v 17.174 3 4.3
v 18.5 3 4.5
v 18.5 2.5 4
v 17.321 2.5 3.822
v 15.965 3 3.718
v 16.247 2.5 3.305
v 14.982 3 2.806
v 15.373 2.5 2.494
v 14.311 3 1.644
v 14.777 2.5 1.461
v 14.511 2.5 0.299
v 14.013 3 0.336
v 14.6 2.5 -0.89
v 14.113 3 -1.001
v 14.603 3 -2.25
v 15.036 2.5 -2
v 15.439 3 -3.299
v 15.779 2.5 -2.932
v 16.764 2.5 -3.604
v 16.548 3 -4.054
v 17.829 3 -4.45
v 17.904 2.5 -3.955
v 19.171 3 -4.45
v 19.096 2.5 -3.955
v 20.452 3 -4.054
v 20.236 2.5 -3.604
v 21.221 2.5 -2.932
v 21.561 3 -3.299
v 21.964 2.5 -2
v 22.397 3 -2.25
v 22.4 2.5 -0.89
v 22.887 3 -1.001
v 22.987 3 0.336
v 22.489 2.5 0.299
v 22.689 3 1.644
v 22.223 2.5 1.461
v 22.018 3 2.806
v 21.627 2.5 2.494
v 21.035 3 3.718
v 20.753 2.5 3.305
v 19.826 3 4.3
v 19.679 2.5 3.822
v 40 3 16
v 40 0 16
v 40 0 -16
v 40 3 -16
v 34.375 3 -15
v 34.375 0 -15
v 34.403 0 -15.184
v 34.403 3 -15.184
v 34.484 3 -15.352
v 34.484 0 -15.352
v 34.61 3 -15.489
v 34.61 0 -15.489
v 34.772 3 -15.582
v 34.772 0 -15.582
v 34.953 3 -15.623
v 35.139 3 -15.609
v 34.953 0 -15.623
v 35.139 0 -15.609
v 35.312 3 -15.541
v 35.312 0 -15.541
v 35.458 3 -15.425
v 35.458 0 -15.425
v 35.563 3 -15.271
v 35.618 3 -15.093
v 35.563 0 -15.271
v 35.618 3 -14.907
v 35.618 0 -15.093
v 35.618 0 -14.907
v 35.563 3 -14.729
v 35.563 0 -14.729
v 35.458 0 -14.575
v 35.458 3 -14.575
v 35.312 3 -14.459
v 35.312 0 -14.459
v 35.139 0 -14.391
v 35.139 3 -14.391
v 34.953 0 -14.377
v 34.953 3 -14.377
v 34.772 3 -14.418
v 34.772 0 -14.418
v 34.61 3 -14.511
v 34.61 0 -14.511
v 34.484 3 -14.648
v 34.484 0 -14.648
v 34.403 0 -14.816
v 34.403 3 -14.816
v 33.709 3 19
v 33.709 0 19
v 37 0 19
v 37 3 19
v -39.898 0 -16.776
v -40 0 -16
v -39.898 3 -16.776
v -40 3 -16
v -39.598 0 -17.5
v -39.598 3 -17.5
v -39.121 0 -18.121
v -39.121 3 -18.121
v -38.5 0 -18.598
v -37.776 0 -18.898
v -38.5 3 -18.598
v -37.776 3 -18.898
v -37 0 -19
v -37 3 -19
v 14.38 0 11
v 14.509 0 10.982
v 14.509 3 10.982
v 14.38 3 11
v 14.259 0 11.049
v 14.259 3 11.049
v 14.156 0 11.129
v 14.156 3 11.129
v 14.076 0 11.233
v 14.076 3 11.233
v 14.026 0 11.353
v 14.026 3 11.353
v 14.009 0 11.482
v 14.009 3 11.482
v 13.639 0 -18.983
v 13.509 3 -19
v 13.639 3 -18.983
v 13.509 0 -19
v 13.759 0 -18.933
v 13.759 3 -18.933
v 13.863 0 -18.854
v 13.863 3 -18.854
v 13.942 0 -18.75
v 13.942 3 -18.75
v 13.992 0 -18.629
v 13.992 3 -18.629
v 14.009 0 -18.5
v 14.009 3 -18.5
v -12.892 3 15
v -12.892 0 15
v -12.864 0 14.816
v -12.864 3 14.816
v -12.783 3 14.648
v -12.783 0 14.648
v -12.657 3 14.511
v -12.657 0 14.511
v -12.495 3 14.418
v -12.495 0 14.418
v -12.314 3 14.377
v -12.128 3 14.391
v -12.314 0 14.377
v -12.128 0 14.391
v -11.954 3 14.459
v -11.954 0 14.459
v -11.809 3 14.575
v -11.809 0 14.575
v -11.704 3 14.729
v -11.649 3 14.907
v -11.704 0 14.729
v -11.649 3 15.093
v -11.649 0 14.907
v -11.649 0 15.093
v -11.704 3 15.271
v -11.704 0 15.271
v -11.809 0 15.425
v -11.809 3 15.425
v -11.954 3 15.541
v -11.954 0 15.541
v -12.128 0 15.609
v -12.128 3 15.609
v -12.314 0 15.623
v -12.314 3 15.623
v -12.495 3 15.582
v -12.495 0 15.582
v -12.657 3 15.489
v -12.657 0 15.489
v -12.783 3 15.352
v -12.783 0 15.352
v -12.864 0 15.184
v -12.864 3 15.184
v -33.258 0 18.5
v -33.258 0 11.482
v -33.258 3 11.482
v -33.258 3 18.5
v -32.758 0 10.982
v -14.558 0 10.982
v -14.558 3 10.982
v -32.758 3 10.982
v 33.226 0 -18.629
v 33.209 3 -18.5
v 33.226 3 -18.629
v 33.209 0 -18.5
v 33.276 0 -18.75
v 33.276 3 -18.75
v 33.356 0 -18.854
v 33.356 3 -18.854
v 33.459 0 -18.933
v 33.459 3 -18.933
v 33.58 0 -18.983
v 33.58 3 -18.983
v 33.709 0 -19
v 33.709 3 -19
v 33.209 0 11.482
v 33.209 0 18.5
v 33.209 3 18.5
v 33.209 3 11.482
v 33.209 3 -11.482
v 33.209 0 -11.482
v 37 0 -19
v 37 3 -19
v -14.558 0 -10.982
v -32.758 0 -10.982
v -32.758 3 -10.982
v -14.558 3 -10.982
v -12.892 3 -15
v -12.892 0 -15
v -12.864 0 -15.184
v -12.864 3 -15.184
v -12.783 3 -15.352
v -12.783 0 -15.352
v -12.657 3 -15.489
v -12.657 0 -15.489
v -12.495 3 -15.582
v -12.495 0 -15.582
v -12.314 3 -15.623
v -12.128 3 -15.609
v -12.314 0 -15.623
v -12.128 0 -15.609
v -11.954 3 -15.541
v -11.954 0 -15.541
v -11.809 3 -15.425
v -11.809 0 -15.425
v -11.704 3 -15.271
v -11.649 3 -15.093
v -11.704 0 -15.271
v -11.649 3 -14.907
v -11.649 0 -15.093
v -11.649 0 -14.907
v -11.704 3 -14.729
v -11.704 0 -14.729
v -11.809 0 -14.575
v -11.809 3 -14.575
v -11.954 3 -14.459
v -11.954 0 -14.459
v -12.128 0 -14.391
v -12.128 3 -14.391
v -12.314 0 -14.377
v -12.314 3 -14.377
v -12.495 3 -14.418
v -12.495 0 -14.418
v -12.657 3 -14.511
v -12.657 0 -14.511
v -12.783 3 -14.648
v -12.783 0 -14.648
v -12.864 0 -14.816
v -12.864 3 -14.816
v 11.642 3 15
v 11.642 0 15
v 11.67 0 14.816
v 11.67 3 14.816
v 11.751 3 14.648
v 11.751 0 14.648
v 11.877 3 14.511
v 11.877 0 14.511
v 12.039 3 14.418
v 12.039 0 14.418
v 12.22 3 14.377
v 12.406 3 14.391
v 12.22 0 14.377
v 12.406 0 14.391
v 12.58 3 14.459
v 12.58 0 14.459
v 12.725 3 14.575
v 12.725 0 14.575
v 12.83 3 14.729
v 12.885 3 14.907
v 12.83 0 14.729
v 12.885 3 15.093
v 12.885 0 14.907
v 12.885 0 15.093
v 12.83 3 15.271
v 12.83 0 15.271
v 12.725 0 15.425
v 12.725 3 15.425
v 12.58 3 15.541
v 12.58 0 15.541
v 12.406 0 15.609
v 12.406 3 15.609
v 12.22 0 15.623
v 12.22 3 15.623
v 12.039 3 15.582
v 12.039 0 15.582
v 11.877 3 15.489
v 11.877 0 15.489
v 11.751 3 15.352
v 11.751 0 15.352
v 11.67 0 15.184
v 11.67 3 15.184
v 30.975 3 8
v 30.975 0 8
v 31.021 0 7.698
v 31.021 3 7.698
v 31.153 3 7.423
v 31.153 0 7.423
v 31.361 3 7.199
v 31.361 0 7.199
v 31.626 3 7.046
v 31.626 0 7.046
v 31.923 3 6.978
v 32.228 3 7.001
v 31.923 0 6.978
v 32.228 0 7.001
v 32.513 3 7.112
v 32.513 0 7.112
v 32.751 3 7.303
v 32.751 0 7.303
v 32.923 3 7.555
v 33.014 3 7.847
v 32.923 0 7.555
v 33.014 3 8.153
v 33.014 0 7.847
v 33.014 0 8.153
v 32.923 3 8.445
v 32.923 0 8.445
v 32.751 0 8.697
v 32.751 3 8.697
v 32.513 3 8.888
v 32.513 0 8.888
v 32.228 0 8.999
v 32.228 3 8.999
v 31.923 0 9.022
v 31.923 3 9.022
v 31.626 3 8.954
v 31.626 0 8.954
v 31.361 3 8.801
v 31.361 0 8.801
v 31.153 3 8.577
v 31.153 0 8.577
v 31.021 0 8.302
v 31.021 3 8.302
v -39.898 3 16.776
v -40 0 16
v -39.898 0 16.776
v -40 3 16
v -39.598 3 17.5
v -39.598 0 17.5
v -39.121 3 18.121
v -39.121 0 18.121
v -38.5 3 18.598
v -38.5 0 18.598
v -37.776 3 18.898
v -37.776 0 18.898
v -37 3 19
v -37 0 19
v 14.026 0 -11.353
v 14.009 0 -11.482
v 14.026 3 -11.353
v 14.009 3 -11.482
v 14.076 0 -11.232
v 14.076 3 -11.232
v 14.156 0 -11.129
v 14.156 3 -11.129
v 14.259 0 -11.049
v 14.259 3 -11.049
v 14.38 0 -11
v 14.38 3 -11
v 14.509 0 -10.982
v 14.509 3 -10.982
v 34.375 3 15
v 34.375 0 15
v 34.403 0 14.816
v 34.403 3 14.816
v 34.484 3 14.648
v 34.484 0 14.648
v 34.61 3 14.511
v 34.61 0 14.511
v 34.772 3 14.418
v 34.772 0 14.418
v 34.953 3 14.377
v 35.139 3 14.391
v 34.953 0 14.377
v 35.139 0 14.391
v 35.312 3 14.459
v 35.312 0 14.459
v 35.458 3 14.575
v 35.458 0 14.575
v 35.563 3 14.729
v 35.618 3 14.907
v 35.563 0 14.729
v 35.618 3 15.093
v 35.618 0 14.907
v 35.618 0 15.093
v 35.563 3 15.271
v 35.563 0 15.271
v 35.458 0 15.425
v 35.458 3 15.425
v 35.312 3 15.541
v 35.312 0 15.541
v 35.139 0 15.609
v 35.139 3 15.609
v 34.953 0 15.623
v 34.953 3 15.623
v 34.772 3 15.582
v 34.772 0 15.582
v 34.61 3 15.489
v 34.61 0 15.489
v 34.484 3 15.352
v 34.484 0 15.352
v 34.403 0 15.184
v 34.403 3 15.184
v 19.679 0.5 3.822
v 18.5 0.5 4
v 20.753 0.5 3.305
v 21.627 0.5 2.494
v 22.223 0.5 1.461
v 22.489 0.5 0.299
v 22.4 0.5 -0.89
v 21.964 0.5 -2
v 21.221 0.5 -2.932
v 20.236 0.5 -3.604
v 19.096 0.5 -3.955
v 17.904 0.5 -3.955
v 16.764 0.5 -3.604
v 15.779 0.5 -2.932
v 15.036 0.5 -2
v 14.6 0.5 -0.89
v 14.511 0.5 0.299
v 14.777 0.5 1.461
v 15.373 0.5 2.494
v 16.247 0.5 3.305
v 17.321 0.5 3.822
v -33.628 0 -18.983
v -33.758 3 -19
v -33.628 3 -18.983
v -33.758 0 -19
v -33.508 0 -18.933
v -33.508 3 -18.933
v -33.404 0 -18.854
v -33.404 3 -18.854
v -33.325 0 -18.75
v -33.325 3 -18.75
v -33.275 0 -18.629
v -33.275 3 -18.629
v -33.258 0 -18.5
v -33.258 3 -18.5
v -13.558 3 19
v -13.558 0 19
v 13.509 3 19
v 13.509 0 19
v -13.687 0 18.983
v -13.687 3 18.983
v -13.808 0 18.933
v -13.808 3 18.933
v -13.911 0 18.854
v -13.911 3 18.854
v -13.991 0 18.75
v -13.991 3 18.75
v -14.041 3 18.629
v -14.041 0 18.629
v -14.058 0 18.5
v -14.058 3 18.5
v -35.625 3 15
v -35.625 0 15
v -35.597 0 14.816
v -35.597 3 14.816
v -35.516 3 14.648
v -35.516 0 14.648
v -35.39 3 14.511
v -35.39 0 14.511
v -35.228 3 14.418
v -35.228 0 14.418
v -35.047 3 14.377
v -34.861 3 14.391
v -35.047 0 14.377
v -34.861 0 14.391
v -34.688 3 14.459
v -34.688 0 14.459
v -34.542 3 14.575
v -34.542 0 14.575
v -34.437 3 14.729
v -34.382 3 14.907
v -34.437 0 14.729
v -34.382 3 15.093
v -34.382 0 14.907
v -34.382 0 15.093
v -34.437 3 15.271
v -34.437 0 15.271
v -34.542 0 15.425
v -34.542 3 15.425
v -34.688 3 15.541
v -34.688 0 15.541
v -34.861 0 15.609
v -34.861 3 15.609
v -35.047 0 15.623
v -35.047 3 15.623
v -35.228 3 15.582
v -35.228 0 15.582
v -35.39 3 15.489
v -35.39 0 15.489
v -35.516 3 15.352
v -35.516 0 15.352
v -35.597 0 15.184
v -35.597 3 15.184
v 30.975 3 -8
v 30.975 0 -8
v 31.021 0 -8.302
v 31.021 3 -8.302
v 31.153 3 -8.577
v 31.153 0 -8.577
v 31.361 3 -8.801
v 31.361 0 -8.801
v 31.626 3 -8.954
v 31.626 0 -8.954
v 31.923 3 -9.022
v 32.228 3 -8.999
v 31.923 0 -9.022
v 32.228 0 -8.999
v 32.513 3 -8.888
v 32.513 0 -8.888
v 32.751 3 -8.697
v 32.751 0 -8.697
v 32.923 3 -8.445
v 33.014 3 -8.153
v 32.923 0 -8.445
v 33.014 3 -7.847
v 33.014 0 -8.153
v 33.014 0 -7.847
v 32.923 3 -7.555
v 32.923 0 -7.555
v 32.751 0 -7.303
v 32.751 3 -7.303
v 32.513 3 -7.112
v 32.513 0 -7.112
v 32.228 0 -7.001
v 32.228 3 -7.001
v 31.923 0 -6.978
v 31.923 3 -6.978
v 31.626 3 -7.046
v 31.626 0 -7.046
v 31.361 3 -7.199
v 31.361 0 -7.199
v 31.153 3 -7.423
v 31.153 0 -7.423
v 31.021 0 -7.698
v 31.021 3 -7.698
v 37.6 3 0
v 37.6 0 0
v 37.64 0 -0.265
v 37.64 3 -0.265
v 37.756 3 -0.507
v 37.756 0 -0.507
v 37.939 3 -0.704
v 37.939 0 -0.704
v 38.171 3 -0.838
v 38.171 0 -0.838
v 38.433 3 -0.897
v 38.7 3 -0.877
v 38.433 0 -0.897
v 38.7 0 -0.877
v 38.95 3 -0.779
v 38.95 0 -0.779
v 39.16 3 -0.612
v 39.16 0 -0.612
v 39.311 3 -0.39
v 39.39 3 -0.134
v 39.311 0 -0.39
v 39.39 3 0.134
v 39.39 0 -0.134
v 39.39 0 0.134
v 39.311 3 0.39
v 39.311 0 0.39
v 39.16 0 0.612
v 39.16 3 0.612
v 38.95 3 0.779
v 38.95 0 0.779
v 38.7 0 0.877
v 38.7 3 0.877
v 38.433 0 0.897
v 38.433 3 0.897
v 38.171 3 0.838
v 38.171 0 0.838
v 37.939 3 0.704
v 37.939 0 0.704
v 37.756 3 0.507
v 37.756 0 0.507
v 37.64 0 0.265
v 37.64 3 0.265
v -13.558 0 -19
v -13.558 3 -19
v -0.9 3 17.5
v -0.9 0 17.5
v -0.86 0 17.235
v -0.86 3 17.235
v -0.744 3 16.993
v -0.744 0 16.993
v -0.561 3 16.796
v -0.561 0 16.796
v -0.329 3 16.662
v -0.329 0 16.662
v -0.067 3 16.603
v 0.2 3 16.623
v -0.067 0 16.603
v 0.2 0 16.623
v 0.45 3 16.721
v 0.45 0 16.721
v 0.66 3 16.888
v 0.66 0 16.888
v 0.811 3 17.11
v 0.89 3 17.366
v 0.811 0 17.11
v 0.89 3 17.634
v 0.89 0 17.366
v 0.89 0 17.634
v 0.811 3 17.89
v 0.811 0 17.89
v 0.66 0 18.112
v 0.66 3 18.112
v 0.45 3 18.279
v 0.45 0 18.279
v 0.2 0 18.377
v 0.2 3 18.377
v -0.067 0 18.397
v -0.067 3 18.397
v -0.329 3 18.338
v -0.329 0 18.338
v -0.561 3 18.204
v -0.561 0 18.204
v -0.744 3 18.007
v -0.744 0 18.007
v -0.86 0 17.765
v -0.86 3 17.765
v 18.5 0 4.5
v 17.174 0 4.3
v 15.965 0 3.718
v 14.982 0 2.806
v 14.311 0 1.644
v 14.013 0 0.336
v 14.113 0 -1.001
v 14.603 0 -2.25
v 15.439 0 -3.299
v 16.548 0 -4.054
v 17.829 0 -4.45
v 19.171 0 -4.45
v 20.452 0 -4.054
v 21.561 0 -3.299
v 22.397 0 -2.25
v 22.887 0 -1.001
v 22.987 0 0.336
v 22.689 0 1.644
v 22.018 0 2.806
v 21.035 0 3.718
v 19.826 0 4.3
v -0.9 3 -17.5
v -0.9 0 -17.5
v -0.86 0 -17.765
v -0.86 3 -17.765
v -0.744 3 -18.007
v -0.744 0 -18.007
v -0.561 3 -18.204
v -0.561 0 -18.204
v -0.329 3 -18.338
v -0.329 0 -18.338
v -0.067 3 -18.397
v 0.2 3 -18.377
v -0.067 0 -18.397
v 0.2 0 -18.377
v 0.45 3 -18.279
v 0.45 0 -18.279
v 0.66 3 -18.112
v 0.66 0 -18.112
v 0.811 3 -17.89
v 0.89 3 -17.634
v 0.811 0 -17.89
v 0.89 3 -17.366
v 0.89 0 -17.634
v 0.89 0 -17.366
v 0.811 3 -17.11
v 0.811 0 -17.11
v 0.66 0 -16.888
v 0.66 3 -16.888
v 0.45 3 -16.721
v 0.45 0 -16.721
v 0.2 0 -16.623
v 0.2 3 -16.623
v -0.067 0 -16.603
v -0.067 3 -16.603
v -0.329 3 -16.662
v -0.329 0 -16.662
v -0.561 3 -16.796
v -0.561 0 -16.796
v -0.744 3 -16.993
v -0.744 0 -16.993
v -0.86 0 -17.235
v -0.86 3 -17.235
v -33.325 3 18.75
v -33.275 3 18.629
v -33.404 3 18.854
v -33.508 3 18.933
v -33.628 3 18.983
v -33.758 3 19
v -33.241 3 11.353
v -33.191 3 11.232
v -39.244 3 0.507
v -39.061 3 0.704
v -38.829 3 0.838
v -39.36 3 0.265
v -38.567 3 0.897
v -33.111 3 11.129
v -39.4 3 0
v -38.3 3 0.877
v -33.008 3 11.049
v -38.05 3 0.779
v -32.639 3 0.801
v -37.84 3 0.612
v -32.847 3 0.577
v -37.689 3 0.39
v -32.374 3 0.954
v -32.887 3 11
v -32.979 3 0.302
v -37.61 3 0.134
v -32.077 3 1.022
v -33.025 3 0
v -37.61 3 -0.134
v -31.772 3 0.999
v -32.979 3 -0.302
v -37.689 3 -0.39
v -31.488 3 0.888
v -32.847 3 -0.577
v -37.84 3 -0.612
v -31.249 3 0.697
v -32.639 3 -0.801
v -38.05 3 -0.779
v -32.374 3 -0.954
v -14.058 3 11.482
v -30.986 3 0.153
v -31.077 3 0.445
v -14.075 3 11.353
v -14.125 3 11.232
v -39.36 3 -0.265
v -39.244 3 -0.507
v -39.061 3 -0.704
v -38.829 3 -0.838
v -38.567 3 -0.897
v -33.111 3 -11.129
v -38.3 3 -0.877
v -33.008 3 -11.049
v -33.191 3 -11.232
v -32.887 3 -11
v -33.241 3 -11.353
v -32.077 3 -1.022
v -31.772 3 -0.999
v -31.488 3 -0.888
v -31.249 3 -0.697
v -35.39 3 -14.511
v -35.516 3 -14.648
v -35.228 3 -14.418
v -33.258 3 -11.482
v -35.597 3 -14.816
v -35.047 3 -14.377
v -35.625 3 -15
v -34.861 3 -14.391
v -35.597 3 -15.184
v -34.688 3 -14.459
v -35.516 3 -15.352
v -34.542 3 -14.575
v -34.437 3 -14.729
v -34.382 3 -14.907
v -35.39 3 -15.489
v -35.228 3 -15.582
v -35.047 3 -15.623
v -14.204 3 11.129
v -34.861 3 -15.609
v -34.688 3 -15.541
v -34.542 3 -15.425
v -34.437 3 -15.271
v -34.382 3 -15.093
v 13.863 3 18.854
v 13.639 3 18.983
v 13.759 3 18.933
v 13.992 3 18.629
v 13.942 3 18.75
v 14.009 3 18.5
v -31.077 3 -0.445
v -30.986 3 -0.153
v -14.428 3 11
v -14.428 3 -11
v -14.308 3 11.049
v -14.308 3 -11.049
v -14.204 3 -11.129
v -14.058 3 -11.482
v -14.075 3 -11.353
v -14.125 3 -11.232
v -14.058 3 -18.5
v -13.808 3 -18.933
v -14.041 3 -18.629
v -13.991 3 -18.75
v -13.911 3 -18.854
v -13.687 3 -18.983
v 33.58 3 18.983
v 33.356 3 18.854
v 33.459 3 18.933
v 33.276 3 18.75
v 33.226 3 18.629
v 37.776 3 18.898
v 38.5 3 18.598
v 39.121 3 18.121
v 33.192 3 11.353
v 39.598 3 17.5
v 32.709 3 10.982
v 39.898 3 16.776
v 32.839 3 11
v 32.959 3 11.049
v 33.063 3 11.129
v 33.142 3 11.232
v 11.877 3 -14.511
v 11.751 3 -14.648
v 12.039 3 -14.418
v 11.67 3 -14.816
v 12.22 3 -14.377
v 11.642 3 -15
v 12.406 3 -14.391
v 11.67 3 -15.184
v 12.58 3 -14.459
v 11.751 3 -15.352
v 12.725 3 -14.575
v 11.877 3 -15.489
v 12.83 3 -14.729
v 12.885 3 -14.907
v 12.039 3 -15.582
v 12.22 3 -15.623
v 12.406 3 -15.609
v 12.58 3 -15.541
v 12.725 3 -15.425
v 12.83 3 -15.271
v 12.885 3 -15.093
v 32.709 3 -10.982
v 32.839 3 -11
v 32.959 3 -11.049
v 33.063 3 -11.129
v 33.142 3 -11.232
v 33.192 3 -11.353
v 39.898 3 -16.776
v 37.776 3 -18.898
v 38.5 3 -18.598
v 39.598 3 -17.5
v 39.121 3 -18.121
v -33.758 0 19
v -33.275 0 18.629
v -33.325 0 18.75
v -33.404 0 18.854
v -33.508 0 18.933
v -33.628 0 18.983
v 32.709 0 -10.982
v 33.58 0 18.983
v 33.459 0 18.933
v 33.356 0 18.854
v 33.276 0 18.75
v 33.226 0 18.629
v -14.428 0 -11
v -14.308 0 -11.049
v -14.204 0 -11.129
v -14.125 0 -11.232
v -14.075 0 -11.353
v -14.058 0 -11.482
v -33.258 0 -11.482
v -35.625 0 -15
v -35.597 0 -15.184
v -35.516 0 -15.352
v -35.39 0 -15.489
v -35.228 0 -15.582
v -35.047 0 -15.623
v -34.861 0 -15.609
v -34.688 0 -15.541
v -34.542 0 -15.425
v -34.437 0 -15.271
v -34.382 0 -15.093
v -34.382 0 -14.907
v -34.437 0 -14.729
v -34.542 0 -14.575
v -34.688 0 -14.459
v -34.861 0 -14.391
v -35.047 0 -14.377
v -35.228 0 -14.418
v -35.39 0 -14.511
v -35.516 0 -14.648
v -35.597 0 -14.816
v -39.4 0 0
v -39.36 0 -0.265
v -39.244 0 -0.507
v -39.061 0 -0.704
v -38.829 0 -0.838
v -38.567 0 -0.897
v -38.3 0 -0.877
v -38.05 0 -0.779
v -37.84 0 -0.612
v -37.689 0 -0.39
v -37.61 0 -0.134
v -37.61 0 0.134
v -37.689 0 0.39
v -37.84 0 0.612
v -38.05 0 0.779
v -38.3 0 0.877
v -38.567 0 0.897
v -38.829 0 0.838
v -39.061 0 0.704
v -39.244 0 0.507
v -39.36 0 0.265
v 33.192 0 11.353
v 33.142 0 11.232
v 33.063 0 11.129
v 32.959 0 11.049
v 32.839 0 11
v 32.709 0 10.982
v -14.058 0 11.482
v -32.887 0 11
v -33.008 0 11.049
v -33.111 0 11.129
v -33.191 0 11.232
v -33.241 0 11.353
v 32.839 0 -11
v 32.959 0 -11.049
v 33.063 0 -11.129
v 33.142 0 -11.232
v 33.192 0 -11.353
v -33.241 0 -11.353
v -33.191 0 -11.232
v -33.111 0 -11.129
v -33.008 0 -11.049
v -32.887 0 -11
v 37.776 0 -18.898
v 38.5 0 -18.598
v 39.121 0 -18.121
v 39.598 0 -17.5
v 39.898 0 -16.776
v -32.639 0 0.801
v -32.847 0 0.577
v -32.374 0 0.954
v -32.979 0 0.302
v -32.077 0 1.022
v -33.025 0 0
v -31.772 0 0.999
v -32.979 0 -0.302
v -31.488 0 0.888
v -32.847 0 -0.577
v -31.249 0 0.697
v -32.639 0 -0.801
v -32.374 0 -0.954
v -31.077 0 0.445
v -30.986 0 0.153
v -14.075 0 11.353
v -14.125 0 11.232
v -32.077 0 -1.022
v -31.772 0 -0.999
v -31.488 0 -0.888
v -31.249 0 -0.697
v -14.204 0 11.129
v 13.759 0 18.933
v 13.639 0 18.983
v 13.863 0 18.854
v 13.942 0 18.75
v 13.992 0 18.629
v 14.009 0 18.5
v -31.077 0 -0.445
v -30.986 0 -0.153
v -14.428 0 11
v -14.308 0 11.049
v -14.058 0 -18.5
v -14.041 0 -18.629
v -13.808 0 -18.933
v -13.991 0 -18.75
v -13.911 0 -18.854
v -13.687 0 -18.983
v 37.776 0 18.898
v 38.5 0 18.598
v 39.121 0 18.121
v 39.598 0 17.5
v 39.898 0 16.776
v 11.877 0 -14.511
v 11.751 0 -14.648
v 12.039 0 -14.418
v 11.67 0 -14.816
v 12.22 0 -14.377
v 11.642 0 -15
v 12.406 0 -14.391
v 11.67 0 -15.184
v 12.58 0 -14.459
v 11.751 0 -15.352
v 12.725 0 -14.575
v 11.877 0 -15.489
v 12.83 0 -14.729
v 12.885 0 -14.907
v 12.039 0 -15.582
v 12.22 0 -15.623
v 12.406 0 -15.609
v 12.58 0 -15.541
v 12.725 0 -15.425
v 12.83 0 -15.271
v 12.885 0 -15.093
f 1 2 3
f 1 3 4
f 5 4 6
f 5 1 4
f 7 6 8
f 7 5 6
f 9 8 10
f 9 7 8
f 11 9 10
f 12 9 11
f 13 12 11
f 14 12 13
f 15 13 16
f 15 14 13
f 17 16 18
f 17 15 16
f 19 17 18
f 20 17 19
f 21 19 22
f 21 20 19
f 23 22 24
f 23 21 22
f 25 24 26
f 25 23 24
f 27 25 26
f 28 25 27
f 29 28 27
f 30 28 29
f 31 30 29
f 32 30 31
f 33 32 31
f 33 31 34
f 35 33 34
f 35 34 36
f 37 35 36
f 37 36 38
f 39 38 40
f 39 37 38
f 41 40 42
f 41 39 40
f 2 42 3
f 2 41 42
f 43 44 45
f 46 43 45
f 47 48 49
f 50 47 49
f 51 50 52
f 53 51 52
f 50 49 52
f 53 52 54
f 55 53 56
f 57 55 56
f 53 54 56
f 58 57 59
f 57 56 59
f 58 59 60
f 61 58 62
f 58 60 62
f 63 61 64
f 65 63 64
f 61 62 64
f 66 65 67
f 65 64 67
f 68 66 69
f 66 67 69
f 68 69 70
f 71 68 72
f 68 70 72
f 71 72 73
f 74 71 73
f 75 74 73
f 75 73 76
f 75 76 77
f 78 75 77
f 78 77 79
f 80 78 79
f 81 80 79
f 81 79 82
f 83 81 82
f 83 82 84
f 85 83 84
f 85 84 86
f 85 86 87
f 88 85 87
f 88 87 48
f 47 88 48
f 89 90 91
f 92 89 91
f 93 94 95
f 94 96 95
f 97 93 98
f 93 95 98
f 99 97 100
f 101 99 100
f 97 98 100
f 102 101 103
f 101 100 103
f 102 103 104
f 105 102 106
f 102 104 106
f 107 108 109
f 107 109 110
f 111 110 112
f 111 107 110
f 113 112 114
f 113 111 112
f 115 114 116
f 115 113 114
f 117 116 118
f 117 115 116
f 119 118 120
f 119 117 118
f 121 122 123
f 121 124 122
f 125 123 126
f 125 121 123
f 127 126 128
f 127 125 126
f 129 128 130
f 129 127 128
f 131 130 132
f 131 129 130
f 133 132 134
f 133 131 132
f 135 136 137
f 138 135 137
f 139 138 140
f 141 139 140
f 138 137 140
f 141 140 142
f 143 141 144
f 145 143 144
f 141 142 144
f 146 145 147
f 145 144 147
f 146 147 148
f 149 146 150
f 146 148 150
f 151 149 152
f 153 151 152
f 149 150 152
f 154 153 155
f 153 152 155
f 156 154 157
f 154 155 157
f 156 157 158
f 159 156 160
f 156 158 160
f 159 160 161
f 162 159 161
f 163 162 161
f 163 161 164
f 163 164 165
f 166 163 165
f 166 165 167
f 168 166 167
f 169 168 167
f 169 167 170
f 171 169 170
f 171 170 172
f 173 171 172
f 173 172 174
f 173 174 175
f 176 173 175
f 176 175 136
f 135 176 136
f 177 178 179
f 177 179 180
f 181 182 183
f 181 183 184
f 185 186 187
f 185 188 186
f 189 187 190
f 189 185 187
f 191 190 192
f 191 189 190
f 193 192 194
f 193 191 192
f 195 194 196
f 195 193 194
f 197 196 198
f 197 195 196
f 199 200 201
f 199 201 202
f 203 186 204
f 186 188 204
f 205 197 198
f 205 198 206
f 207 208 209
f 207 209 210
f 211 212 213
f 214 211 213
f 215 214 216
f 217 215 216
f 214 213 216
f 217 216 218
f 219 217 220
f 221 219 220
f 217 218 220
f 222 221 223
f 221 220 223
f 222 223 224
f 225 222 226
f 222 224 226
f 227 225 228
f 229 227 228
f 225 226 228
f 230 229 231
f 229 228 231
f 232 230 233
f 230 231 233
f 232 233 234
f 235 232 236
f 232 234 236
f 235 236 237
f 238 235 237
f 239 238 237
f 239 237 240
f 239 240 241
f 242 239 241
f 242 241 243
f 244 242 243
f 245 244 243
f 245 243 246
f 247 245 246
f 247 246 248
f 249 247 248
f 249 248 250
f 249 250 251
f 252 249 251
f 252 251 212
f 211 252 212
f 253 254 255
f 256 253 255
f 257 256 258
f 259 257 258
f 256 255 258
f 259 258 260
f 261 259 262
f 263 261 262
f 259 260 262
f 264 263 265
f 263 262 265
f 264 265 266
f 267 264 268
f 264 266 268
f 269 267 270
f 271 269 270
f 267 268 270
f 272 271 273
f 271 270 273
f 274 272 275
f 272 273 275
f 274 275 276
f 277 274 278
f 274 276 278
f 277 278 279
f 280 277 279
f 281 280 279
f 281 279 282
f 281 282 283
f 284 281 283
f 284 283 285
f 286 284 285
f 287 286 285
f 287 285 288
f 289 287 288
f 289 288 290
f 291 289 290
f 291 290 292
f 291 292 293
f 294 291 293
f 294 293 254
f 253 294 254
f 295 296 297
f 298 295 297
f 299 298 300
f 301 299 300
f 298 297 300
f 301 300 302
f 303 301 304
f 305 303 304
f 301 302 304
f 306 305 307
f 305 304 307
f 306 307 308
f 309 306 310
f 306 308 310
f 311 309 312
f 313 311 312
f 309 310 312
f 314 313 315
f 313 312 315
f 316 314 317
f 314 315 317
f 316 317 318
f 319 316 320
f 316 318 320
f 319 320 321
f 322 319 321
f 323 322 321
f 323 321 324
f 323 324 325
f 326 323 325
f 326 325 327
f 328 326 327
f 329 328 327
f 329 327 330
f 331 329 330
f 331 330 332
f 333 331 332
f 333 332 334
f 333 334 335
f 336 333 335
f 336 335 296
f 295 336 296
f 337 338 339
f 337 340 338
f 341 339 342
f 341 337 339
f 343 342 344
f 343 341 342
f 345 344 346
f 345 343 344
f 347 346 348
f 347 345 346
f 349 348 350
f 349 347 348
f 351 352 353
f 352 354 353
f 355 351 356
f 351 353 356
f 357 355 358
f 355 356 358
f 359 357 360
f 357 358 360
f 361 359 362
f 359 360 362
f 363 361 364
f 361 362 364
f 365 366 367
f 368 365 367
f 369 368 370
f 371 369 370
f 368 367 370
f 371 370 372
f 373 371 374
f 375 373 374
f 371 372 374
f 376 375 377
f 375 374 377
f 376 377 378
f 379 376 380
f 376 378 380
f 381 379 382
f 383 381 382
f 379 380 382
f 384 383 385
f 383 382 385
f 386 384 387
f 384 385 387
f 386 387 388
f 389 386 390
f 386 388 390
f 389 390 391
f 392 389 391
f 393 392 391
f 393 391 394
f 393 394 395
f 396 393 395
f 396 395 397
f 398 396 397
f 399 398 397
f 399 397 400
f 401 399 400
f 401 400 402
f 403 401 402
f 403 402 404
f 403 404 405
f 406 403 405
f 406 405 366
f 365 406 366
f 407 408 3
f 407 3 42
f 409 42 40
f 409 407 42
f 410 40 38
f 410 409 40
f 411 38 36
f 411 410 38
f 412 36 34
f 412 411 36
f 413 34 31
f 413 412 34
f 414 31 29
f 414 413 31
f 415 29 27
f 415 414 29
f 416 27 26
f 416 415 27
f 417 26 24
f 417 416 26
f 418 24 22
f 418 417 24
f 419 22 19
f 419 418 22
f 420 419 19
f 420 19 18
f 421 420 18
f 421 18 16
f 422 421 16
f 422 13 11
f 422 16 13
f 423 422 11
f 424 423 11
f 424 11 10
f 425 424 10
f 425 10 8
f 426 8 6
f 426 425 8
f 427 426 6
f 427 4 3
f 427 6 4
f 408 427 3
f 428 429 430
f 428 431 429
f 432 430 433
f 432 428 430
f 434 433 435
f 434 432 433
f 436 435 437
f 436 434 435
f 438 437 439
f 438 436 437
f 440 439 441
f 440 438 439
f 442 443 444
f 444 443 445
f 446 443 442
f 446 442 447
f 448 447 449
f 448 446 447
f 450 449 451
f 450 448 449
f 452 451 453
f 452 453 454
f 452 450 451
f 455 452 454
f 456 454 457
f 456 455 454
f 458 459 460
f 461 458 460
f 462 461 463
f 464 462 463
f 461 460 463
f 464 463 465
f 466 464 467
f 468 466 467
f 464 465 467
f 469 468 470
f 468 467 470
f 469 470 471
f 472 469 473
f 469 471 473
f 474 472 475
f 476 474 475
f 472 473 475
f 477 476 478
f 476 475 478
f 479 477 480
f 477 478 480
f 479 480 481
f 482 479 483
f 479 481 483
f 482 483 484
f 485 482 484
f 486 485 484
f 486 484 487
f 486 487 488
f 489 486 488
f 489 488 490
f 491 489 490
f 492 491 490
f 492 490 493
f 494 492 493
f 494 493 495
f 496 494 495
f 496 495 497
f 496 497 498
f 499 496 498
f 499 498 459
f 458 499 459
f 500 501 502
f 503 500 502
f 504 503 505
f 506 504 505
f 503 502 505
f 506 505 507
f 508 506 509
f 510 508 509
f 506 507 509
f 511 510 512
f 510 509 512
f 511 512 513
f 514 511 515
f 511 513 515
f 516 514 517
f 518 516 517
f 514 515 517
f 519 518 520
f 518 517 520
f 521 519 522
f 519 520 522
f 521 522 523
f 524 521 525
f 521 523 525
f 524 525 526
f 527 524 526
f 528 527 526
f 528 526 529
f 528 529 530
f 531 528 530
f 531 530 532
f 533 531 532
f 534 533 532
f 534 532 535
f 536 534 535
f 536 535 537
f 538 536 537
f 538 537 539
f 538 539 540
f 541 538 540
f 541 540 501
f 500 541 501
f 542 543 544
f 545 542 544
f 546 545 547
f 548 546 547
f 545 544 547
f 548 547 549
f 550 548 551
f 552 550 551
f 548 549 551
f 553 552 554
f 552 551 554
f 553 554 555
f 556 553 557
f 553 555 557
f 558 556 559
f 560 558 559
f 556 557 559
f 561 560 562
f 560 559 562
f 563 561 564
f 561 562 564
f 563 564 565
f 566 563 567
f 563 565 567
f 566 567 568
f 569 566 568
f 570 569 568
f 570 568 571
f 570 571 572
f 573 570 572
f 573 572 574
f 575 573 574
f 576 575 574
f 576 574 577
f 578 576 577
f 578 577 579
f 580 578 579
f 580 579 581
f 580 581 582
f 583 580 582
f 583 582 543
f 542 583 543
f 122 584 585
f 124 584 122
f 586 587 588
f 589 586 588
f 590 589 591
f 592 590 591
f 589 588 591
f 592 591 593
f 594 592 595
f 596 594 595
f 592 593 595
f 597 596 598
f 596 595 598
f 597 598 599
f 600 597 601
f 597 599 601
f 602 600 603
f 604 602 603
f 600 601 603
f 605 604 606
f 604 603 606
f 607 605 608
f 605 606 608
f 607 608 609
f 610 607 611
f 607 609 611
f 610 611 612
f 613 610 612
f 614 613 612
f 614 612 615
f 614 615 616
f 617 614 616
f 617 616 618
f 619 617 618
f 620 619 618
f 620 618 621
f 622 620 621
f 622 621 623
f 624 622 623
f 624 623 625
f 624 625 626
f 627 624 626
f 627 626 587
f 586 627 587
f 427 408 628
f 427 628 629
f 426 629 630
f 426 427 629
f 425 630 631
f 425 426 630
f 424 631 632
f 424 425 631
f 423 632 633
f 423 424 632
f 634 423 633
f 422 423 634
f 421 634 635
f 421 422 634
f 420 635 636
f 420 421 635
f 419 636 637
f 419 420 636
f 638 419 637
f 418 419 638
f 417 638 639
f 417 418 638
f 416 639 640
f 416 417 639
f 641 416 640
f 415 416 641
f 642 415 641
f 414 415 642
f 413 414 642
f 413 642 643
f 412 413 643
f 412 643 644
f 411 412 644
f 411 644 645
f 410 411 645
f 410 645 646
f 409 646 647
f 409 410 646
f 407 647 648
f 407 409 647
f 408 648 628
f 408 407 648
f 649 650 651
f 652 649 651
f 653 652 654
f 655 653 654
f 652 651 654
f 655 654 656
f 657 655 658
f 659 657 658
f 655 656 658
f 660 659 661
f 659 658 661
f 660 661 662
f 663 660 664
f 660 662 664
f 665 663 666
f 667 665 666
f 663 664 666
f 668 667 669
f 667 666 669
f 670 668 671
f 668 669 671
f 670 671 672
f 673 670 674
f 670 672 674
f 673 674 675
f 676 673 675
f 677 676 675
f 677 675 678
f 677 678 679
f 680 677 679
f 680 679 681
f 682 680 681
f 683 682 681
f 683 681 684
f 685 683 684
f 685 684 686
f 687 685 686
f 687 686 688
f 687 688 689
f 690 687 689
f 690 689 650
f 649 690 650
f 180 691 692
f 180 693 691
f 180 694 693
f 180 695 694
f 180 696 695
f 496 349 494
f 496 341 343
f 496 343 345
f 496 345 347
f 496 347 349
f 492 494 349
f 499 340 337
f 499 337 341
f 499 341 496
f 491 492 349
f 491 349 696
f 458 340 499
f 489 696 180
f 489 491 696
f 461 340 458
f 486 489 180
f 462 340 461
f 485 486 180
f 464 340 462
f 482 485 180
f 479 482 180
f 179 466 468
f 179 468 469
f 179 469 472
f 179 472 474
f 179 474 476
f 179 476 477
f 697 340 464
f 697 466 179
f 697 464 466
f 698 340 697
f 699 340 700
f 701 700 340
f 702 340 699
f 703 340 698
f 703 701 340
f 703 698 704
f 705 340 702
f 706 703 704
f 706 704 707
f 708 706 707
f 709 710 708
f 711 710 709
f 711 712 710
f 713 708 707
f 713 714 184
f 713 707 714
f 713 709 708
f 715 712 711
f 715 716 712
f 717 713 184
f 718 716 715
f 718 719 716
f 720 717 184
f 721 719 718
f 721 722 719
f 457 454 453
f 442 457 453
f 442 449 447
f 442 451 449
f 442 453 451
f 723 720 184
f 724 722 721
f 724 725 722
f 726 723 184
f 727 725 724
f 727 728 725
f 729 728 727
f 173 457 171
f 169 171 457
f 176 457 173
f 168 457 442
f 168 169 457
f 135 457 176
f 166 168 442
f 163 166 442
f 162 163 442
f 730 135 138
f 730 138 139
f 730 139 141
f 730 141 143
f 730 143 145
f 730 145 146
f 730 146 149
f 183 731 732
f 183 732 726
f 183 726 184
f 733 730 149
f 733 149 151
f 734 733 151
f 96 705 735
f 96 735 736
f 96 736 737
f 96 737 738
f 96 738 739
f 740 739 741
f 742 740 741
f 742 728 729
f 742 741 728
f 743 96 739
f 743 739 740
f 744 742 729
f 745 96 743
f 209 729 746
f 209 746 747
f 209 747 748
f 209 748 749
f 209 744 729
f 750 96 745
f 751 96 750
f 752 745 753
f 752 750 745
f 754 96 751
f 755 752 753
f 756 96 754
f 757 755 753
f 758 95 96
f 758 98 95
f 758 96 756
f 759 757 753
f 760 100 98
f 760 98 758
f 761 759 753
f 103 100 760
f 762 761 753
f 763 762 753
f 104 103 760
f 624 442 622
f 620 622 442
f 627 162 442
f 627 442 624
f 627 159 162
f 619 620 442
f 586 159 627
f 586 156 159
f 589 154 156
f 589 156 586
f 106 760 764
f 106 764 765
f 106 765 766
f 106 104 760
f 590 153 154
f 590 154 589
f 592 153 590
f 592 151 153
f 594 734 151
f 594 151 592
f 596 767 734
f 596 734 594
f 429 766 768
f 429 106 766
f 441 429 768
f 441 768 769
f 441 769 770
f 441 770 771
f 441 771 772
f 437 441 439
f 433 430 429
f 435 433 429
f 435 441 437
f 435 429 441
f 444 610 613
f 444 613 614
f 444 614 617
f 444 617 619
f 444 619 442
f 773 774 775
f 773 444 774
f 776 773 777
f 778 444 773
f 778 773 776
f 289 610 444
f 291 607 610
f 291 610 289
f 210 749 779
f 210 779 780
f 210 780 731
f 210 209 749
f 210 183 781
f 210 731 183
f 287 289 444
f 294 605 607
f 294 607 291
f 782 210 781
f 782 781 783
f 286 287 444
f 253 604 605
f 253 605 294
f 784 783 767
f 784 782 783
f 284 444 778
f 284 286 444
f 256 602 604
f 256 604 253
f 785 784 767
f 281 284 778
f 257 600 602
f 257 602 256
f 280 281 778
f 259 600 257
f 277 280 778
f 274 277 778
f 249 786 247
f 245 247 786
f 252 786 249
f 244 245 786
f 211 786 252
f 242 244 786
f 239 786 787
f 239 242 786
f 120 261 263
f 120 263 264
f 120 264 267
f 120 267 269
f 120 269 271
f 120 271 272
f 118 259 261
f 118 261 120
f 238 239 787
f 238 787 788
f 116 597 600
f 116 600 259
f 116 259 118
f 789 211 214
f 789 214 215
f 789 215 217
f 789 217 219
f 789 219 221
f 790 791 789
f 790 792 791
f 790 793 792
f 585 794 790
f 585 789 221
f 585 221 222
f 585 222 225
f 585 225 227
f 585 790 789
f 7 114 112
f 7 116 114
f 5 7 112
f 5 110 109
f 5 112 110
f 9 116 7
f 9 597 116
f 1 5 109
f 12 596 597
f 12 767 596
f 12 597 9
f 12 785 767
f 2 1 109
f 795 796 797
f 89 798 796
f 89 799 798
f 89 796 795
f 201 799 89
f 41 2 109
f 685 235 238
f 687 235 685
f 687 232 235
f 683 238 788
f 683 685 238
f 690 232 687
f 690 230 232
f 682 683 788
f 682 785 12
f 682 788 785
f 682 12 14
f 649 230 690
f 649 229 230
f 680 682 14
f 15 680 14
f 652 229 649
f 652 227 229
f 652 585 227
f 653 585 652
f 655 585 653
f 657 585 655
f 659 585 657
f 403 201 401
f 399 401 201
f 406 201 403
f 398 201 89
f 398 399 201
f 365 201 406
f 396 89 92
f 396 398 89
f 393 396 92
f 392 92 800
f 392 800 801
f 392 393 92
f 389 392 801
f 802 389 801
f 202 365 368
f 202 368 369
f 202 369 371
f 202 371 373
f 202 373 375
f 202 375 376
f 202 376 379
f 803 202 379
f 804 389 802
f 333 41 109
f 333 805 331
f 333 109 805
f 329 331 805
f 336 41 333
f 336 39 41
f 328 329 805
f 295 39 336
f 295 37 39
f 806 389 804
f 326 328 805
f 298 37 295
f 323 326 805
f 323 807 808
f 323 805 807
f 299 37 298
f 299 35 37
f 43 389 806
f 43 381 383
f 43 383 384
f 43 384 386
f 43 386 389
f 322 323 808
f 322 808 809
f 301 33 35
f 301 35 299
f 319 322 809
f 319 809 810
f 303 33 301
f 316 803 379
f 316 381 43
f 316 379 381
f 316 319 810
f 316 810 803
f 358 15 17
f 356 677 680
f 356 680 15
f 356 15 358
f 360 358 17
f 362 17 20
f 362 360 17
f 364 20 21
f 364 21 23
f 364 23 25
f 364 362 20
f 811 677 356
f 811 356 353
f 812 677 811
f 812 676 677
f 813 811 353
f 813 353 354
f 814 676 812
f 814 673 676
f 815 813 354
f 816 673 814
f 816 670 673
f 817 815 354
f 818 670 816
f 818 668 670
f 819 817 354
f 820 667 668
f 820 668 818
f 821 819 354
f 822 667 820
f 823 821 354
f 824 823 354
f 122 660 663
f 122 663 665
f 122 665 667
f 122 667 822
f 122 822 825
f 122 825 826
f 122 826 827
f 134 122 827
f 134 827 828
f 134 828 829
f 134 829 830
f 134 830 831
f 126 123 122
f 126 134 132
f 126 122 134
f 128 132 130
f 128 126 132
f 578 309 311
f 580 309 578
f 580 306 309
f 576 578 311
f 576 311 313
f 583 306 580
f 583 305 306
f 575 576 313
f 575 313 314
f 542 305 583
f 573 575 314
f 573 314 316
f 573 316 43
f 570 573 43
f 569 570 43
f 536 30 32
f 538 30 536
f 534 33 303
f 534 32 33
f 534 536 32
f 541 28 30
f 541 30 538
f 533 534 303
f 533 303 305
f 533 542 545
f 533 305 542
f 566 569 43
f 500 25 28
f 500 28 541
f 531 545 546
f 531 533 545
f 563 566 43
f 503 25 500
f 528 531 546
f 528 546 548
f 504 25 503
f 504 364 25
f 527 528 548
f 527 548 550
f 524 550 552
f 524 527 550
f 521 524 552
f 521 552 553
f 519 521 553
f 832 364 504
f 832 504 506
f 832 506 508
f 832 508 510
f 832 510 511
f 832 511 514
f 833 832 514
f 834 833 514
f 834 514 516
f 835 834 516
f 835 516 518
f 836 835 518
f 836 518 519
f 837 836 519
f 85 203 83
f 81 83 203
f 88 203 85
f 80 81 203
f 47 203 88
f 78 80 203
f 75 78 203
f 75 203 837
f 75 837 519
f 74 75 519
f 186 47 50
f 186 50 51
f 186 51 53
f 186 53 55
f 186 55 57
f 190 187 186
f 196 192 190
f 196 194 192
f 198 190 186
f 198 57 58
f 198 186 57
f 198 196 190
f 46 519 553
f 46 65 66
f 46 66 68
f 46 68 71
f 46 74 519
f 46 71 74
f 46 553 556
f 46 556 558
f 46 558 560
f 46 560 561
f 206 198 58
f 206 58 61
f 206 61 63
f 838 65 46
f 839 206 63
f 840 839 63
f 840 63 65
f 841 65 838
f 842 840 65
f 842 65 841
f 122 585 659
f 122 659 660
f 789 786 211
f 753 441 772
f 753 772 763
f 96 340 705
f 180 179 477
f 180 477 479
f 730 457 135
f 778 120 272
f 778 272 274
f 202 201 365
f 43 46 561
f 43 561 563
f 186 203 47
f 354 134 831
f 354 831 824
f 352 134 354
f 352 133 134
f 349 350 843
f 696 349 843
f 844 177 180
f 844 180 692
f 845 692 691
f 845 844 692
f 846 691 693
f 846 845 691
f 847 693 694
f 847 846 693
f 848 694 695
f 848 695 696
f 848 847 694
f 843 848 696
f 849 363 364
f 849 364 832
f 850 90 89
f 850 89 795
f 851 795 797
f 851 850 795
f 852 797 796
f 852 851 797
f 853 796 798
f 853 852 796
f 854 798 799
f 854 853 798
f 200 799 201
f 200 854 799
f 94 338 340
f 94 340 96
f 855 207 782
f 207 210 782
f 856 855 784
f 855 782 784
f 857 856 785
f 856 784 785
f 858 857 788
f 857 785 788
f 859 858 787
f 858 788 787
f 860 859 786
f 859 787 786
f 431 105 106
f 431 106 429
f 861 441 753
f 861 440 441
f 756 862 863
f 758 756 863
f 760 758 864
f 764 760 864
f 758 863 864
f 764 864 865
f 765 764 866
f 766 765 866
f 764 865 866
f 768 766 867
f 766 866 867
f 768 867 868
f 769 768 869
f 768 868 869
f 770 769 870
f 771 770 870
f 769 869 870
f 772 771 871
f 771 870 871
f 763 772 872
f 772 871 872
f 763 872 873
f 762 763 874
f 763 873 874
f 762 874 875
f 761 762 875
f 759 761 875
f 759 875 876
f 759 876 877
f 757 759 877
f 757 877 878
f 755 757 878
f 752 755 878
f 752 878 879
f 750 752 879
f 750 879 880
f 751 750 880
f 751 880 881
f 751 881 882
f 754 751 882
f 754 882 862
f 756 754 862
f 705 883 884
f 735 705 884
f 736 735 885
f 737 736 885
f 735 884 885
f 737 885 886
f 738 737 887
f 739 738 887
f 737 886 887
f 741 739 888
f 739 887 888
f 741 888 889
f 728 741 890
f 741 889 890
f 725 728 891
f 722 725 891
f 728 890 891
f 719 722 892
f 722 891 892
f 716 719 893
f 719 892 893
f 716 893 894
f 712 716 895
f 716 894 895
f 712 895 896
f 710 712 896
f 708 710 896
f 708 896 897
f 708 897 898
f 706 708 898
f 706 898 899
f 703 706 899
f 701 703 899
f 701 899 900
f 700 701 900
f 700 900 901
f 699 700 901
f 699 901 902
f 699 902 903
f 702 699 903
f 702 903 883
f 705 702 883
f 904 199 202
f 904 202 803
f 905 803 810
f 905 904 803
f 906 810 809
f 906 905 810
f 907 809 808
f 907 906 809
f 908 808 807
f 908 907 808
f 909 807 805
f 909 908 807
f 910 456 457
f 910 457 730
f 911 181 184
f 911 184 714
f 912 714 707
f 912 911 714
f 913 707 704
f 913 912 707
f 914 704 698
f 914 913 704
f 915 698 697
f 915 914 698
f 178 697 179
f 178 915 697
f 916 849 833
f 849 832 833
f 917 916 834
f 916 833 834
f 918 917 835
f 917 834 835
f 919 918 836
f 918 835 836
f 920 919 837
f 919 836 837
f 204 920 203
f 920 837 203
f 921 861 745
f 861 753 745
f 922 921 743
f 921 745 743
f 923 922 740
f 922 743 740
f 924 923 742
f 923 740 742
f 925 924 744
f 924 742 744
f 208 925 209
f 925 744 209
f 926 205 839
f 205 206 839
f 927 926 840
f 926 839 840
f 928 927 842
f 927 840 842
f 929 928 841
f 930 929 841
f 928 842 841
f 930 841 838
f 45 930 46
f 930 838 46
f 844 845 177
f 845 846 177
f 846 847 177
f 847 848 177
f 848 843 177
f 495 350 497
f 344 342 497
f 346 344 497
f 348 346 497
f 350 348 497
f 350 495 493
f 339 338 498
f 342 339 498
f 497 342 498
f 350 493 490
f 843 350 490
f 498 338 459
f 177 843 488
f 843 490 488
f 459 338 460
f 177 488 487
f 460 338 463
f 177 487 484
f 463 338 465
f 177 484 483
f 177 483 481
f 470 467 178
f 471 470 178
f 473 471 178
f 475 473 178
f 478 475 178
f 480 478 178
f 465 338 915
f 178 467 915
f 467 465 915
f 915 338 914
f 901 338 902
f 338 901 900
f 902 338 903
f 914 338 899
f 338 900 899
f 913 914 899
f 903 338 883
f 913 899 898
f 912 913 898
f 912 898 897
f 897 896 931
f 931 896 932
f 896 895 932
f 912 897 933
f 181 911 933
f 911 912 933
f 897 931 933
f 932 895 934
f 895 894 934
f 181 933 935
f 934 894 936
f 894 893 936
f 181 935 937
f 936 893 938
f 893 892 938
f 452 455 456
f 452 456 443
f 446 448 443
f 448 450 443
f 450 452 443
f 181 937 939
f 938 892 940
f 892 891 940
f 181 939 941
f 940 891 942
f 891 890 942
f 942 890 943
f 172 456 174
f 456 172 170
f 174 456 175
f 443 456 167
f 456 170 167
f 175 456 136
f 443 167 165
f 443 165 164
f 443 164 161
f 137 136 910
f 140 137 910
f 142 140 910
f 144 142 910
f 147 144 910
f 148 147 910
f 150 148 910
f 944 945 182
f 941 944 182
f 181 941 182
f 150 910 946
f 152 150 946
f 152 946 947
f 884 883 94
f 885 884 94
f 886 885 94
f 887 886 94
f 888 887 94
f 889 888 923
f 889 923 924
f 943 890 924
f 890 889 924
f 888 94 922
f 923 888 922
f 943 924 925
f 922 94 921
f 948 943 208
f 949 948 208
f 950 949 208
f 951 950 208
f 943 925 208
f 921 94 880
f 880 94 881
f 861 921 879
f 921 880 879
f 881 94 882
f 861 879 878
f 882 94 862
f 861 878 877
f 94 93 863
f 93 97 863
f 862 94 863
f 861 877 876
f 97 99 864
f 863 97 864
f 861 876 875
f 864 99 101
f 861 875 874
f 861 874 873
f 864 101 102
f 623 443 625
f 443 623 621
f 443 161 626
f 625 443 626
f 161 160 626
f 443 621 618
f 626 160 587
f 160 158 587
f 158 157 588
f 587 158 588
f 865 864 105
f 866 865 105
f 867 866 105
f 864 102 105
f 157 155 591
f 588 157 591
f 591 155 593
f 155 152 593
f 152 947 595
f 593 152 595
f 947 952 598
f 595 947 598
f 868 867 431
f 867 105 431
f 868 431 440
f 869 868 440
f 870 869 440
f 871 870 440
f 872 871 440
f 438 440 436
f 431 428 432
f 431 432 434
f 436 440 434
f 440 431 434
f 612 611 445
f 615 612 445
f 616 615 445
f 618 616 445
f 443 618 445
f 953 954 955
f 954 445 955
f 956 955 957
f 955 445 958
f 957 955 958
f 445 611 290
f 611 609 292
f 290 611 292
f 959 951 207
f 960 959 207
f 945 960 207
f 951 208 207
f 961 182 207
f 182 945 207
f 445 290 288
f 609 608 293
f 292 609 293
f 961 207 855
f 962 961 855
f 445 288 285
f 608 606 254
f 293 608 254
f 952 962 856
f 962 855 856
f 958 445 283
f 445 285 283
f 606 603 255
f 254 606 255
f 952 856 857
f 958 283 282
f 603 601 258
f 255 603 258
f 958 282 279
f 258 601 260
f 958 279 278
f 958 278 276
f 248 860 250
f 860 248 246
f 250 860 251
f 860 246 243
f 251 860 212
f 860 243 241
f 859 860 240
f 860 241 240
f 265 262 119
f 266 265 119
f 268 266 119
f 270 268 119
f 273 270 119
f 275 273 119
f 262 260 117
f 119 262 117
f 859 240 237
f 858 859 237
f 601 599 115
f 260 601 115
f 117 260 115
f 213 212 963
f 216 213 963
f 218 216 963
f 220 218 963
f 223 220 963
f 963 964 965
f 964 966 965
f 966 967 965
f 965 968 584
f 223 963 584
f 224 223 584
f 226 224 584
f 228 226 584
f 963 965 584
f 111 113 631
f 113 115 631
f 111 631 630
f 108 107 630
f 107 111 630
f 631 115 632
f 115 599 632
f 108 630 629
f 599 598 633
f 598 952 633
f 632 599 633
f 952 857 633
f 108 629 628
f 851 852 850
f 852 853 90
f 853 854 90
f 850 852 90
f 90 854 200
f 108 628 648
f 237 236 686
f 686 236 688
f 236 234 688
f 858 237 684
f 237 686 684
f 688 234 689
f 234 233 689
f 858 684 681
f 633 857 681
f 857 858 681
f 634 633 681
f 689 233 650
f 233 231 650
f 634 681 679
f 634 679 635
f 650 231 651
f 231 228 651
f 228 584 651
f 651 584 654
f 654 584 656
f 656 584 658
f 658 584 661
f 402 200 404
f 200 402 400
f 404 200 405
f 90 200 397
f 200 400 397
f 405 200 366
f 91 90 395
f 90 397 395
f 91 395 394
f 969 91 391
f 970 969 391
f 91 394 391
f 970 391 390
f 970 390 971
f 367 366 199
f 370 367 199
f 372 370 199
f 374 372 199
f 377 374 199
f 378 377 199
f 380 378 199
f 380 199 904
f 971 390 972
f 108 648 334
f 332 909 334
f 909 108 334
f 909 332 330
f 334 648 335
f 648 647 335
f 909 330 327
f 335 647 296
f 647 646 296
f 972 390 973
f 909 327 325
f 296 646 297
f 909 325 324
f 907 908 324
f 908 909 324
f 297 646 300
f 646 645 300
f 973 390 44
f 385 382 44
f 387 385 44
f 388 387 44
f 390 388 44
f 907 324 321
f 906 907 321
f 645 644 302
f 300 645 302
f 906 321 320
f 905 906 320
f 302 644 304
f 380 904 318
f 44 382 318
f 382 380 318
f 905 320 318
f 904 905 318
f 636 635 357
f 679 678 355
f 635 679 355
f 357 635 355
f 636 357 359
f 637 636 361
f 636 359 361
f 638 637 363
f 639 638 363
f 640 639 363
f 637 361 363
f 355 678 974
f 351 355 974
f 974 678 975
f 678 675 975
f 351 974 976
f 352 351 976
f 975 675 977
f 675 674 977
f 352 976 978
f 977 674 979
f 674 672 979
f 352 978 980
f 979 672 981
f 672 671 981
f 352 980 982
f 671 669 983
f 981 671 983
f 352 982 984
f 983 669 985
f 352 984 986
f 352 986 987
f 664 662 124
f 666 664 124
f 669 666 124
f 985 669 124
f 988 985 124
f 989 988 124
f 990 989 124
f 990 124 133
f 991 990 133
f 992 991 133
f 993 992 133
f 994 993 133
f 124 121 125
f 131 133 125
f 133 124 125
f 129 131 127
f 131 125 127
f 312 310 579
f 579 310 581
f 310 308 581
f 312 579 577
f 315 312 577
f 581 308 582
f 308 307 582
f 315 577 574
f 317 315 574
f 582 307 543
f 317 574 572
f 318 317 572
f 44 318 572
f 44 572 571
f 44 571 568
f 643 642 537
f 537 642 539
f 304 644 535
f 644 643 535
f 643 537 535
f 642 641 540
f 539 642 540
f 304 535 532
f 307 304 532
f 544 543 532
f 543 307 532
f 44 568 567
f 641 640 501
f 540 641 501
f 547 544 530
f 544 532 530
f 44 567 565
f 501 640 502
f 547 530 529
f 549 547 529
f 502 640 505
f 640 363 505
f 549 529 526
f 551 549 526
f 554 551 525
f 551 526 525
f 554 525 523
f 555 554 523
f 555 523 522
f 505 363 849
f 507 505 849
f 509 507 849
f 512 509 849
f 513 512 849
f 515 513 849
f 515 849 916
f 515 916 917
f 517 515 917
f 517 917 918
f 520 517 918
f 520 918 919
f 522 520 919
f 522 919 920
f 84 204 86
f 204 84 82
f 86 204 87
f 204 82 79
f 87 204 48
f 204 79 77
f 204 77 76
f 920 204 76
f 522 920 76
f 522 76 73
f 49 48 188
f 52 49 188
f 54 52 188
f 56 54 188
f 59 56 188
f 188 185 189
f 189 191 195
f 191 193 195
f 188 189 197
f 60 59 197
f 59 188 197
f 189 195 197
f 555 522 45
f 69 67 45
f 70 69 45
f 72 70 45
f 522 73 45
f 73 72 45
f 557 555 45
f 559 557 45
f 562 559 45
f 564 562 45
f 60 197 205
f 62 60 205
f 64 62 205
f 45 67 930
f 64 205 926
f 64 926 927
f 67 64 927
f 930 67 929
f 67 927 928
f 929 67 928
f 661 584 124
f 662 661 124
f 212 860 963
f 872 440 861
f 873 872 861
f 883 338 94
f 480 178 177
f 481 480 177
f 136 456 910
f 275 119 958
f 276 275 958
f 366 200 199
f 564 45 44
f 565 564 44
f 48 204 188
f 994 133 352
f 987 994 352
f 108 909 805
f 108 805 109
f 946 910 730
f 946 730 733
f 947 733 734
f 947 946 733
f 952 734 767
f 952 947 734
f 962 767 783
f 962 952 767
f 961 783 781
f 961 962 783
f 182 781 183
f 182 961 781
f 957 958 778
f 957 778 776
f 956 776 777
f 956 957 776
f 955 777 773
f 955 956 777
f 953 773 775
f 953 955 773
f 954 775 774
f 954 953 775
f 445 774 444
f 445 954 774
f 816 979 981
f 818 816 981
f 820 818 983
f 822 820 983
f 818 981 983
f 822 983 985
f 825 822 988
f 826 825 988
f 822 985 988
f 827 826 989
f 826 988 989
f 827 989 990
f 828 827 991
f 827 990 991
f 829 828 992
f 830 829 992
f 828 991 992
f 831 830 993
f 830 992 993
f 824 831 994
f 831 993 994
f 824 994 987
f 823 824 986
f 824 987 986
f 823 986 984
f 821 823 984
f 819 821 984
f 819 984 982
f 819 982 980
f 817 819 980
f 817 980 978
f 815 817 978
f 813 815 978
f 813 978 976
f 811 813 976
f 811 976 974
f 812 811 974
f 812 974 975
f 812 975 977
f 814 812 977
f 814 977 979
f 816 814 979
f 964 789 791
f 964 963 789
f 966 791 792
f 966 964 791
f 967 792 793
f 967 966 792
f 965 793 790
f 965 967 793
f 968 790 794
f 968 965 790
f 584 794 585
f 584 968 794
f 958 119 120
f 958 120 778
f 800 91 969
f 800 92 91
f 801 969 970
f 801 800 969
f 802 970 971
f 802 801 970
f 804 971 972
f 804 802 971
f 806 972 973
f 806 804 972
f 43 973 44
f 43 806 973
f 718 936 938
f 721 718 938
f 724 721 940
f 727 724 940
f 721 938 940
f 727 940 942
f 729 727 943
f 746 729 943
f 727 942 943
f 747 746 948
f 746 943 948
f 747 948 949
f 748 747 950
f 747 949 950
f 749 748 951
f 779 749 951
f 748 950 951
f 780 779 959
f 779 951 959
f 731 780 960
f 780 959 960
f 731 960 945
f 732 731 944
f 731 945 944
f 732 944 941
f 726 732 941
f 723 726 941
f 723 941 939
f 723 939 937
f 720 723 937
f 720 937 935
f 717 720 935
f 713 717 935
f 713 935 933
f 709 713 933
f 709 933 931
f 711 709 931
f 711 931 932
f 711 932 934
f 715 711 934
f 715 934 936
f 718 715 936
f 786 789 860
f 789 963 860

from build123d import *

# Parameters (mm, degrees)
SKETCH1_W                    = 80
SKETCH1_H                    = 38
BOSS_EXTRUDE1_DEPTH          = 3
M1_6X0_35_TAPPED_HOLE1_D     = 1.25
M1_6X0_35_TAPPED_HOLE1_DEPTH = 4.95
M1_6X0_35_TAPPED_HOLE1_TIP   = 0.375537887
FILLET1_R                    = 3
SKETCH6_W                    = 19.2
SKETCH6_H                    = 8.035
CUT_EXTRUDE1_DEPTH           = 45.384682042
FILLET2_R                    = 0.5
LPATTERN1_COUNT              = 2
LPATTERN1_PITCH              = 47.267
FILLET2_OF_LPATTERN1_R       = 0.5
MIRROR1_DEPTH                = 3
M1_6_CLEARANCE_HOLE3_D       = 1.8
M1_6_CLEARANCE_HOLE3_DEPTH   = 4.25
M1_6_CLEARANCE_HOLE3_TIP     = 0.540774557
M2_5X0_45_TAPPED_HOLE1_D     = 2.05
M2_5X0_45_TAPPED_HOLE1_DEPTH = 7.25
M2_5X0_45_TAPPED_HOLE1_TIP   = 0.615882135
CUT_EXTRUDE2_DEPTH           = 45.384682042
CUT_EXTRUDE2_DEPTH_BACK      = 45.384682042
SKETCH16_R                   = 4
CHAMFER1_SIZE                = 0.5


# Read off the part's stored shape, not the designer's step: Mirror1
with BuildPart() as part:
    # Sketch1 → Boss-Extrude1 (new body)
    with BuildSketch(Plane(origin=(0, 0, 0), x_dir=(1, 0, 0), z_dir=(0, 1, 0))):
        Rectangle(SKETCH1_W, SKETCH1_H)
    extrude(amount=BOSS_EXTRUDE1_DEPTH)

    # M1.6x0.35 Tapped Hole1
    with Locations(Plane(origin=(0, 3, 0), x_dir=(1, 0, 0), z_dir=(0, 1, 0))):
        with Locations((-35, 15), (-12.267, 15), (-12.267, -15), (-35, -15), (12.267, -15), (35, -15), (35, 15), (12.267, 15)):
            Hole(M1_6X0_35_TAPPED_HOLE1_D / 2, depth=M1_6X0_35_TAPPED_HOLE1_DEPTH)
            with Locations((0, 0, -(M1_6X0_35_TAPPED_HOLE1_DEPTH + M1_6X0_35_TAPPED_HOLE1_TIP / 2))):  # 118° drill point
                Cone(0, M1_6X0_35_TAPPED_HOLE1_D / 2, M1_6X0_35_TAPPED_HOLE1_TIP, mode=Mode.SUBTRACT)

    # Fillet1
    fillet1_edges = [part.edges().sort_by_distance(p)[0] for p in [
        (40, 1.5, 19),
        (-40, 1.5, 19),
        (-40, 1.5, -19),
        (40, 1.5, -19),
    ]]
    fillet(fillet1_edges, radius=FILLET1_R)

    # Sketch6 → Cut-Extrude1 (cut, symmetric)
    with BuildSketch(Plane.XZ):
        with Locations((-23.657734471, -15)):
            Rectangle(SKETCH6_W, SKETCH6_H)
    cut_extrude1 = extrude(amount=CUT_EXTRUDE1_DEPTH, both=True, mode=Mode.SUBTRACT)

    # Fillet2
    fillet2_edges = [part.edges().sort_by_distance(p)[0] for p in [
        (-33.257734471, 1.5, -19),
        (-14.057734471, 1.5, -10.9825),
        (-33.257734471, 1.5, -10.9825),
        (-14.057734471, 1.5, -19),
    ]]
    fillet(fillet2_edges, radius=FILLET2_R)

    # LPattern1: Cut-Extrude1 ×2
    with Locations(*[(i * LPATTERN1_PITCH, 0, 0) for i in range(1, LPATTERN1_COUNT)]):
        add(cut_extrude1, mode=Mode.SUBTRACT)

    # Fillet2 of LPattern1
    fillet2_of_lpattern1_edges = [part.edges().sort_by_distance(p)[0] for p in [
        (14.009265529, 1.5, -19),
        (33.209265529, 1.5, -10.9825),
        (14.009265529, 1.5, -10.9825),
        (33.209265529, 1.5, -19),
    ]]
    fillet(fillet2_of_lpattern1_edges, radius=FILLET2_OF_LPATTERN1_R)

    # Mirror1 outline → Mirror1 (cut)
    with BuildSketch(Plane(origin=(0, 0, 0), x_dir=(1, 0, 0), z_dir=(0, 1, 0))):
        with BuildLine():
            ThreePointArc((-32.757734471, -10.9825), (-33.111287862, -11.128946609), (-33.257734471, -11.4825))
            Line((-33.257734471, -11.4825), (-33.257734471, -18.5))
            ThreePointArc((-33.257734471, -18.5), (-33.40418108, -18.853553391), (-33.757734471, -19))
            Line((-33.757734471, -19), (-13.557734471, -19))
            ThreePointArc((-13.557734471, -19), (-13.911287861, -18.853553391), (-14.057734471, -18.5))
            Line((-14.057734471, -18.5), (-14.057734471, -11.4825))
            ThreePointArc((-14.057734471, -11.4825), (-14.20418108, -11.128946609), (-14.557734471, -10.9825))
            Line((-14.557734471, -10.9825), (-32.757734471, -10.9825))
        make_face()
        with BuildLine():
            ThreePointArc((14.009265529, -18.5), (13.86281892, -18.853553391), (13.509265529, -19))
            Line((13.509265529, -19), (33.709265529, -19))
            ThreePointArc((33.709265529, -19), (33.355712139, -18.853553391), (33.209265529, -18.5))
            Line((33.209265529, -18.5), (33.209265529, -11.4825))
            ThreePointArc((33.209265529, -11.4825), (33.06281892, -11.128946609), (32.709265529, -10.9825))
            Line((32.709265529, -10.9825), (14.509265529, -10.9825))
            ThreePointArc((14.509265529, -10.9825), (14.155712139, -11.128946609), (14.009265529, -11.4825))
            Line((14.009265529, -11.4825), (14.009265529, -18.5))
        make_face()
    extrude(amount=MIRROR1_DEPTH, mode=Mode.SUBTRACT)

    # M1.6 Clearance Hole3
    with Locations(Plane(origin=(0, 3, 0), x_dir=(1, 0, 0), z_dir=(0, 1, 0))):
        with Locations((-38.5, 0), (0, 17.5), (38.5, 0), (0, -17.5)):
            Hole(M1_6_CLEARANCE_HOLE3_D / 2, depth=M1_6_CLEARANCE_HOLE3_DEPTH)
            with Locations((0, 0, -(M1_6_CLEARANCE_HOLE3_DEPTH + M1_6_CLEARANCE_HOLE3_TIP / 2))):  # 118° drill point
                Cone(0, M1_6_CLEARANCE_HOLE3_D / 2, M1_6_CLEARANCE_HOLE3_TIP, mode=Mode.SUBTRACT)

    # M2.5x0.45 Tapped Hole1
    with Locations(Plane(origin=(0, 3, 0), x_dir=(1, 0, 0), z_dir=(0, 1, 0))):
        with Locations((32, 8), (32, -8), (-32, 0)):
            Hole(M2_5X0_45_TAPPED_HOLE1_D / 2, depth=M2_5X0_45_TAPPED_HOLE1_DEPTH)
            with Locations((0, 0, -(M2_5X0_45_TAPPED_HOLE1_DEPTH + M2_5X0_45_TAPPED_HOLE1_TIP / 2))):  # 118° drill point
                Cone(0, M2_5X0_45_TAPPED_HOLE1_D / 2, M2_5X0_45_TAPPED_HOLE1_TIP, mode=Mode.SUBTRACT)

    # Sketch16 → Cut-Extrude2 (cut, two sides: drawn at the far end of the back side and taken through both)
    with BuildSketch(Plane(origin=(0, 3, 0), x_dir=(1, 0, 0), z_dir=(0, 1, 0)).offset(-CUT_EXTRUDE2_DEPTH_BACK)):
        with Locations(Location((18.5, 0, 0), (0, 0, 270))):
            Circle(SKETCH16_R)
    extrude(amount=CUT_EXTRUDE2_DEPTH + CUT_EXTRUDE2_DEPTH_BACK, mode=Mode.SUBTRACT)

    # Chamfer1
    chamfer1_edges = [part.edges().sort_by_distance(p)[0] for p in [
        (18.5, 0, -4),
        (18.5, 3, -4),
    ]]
    chamfer(chamfer1_edges, length=CHAMFER1_SIZE)


solid = part.part
